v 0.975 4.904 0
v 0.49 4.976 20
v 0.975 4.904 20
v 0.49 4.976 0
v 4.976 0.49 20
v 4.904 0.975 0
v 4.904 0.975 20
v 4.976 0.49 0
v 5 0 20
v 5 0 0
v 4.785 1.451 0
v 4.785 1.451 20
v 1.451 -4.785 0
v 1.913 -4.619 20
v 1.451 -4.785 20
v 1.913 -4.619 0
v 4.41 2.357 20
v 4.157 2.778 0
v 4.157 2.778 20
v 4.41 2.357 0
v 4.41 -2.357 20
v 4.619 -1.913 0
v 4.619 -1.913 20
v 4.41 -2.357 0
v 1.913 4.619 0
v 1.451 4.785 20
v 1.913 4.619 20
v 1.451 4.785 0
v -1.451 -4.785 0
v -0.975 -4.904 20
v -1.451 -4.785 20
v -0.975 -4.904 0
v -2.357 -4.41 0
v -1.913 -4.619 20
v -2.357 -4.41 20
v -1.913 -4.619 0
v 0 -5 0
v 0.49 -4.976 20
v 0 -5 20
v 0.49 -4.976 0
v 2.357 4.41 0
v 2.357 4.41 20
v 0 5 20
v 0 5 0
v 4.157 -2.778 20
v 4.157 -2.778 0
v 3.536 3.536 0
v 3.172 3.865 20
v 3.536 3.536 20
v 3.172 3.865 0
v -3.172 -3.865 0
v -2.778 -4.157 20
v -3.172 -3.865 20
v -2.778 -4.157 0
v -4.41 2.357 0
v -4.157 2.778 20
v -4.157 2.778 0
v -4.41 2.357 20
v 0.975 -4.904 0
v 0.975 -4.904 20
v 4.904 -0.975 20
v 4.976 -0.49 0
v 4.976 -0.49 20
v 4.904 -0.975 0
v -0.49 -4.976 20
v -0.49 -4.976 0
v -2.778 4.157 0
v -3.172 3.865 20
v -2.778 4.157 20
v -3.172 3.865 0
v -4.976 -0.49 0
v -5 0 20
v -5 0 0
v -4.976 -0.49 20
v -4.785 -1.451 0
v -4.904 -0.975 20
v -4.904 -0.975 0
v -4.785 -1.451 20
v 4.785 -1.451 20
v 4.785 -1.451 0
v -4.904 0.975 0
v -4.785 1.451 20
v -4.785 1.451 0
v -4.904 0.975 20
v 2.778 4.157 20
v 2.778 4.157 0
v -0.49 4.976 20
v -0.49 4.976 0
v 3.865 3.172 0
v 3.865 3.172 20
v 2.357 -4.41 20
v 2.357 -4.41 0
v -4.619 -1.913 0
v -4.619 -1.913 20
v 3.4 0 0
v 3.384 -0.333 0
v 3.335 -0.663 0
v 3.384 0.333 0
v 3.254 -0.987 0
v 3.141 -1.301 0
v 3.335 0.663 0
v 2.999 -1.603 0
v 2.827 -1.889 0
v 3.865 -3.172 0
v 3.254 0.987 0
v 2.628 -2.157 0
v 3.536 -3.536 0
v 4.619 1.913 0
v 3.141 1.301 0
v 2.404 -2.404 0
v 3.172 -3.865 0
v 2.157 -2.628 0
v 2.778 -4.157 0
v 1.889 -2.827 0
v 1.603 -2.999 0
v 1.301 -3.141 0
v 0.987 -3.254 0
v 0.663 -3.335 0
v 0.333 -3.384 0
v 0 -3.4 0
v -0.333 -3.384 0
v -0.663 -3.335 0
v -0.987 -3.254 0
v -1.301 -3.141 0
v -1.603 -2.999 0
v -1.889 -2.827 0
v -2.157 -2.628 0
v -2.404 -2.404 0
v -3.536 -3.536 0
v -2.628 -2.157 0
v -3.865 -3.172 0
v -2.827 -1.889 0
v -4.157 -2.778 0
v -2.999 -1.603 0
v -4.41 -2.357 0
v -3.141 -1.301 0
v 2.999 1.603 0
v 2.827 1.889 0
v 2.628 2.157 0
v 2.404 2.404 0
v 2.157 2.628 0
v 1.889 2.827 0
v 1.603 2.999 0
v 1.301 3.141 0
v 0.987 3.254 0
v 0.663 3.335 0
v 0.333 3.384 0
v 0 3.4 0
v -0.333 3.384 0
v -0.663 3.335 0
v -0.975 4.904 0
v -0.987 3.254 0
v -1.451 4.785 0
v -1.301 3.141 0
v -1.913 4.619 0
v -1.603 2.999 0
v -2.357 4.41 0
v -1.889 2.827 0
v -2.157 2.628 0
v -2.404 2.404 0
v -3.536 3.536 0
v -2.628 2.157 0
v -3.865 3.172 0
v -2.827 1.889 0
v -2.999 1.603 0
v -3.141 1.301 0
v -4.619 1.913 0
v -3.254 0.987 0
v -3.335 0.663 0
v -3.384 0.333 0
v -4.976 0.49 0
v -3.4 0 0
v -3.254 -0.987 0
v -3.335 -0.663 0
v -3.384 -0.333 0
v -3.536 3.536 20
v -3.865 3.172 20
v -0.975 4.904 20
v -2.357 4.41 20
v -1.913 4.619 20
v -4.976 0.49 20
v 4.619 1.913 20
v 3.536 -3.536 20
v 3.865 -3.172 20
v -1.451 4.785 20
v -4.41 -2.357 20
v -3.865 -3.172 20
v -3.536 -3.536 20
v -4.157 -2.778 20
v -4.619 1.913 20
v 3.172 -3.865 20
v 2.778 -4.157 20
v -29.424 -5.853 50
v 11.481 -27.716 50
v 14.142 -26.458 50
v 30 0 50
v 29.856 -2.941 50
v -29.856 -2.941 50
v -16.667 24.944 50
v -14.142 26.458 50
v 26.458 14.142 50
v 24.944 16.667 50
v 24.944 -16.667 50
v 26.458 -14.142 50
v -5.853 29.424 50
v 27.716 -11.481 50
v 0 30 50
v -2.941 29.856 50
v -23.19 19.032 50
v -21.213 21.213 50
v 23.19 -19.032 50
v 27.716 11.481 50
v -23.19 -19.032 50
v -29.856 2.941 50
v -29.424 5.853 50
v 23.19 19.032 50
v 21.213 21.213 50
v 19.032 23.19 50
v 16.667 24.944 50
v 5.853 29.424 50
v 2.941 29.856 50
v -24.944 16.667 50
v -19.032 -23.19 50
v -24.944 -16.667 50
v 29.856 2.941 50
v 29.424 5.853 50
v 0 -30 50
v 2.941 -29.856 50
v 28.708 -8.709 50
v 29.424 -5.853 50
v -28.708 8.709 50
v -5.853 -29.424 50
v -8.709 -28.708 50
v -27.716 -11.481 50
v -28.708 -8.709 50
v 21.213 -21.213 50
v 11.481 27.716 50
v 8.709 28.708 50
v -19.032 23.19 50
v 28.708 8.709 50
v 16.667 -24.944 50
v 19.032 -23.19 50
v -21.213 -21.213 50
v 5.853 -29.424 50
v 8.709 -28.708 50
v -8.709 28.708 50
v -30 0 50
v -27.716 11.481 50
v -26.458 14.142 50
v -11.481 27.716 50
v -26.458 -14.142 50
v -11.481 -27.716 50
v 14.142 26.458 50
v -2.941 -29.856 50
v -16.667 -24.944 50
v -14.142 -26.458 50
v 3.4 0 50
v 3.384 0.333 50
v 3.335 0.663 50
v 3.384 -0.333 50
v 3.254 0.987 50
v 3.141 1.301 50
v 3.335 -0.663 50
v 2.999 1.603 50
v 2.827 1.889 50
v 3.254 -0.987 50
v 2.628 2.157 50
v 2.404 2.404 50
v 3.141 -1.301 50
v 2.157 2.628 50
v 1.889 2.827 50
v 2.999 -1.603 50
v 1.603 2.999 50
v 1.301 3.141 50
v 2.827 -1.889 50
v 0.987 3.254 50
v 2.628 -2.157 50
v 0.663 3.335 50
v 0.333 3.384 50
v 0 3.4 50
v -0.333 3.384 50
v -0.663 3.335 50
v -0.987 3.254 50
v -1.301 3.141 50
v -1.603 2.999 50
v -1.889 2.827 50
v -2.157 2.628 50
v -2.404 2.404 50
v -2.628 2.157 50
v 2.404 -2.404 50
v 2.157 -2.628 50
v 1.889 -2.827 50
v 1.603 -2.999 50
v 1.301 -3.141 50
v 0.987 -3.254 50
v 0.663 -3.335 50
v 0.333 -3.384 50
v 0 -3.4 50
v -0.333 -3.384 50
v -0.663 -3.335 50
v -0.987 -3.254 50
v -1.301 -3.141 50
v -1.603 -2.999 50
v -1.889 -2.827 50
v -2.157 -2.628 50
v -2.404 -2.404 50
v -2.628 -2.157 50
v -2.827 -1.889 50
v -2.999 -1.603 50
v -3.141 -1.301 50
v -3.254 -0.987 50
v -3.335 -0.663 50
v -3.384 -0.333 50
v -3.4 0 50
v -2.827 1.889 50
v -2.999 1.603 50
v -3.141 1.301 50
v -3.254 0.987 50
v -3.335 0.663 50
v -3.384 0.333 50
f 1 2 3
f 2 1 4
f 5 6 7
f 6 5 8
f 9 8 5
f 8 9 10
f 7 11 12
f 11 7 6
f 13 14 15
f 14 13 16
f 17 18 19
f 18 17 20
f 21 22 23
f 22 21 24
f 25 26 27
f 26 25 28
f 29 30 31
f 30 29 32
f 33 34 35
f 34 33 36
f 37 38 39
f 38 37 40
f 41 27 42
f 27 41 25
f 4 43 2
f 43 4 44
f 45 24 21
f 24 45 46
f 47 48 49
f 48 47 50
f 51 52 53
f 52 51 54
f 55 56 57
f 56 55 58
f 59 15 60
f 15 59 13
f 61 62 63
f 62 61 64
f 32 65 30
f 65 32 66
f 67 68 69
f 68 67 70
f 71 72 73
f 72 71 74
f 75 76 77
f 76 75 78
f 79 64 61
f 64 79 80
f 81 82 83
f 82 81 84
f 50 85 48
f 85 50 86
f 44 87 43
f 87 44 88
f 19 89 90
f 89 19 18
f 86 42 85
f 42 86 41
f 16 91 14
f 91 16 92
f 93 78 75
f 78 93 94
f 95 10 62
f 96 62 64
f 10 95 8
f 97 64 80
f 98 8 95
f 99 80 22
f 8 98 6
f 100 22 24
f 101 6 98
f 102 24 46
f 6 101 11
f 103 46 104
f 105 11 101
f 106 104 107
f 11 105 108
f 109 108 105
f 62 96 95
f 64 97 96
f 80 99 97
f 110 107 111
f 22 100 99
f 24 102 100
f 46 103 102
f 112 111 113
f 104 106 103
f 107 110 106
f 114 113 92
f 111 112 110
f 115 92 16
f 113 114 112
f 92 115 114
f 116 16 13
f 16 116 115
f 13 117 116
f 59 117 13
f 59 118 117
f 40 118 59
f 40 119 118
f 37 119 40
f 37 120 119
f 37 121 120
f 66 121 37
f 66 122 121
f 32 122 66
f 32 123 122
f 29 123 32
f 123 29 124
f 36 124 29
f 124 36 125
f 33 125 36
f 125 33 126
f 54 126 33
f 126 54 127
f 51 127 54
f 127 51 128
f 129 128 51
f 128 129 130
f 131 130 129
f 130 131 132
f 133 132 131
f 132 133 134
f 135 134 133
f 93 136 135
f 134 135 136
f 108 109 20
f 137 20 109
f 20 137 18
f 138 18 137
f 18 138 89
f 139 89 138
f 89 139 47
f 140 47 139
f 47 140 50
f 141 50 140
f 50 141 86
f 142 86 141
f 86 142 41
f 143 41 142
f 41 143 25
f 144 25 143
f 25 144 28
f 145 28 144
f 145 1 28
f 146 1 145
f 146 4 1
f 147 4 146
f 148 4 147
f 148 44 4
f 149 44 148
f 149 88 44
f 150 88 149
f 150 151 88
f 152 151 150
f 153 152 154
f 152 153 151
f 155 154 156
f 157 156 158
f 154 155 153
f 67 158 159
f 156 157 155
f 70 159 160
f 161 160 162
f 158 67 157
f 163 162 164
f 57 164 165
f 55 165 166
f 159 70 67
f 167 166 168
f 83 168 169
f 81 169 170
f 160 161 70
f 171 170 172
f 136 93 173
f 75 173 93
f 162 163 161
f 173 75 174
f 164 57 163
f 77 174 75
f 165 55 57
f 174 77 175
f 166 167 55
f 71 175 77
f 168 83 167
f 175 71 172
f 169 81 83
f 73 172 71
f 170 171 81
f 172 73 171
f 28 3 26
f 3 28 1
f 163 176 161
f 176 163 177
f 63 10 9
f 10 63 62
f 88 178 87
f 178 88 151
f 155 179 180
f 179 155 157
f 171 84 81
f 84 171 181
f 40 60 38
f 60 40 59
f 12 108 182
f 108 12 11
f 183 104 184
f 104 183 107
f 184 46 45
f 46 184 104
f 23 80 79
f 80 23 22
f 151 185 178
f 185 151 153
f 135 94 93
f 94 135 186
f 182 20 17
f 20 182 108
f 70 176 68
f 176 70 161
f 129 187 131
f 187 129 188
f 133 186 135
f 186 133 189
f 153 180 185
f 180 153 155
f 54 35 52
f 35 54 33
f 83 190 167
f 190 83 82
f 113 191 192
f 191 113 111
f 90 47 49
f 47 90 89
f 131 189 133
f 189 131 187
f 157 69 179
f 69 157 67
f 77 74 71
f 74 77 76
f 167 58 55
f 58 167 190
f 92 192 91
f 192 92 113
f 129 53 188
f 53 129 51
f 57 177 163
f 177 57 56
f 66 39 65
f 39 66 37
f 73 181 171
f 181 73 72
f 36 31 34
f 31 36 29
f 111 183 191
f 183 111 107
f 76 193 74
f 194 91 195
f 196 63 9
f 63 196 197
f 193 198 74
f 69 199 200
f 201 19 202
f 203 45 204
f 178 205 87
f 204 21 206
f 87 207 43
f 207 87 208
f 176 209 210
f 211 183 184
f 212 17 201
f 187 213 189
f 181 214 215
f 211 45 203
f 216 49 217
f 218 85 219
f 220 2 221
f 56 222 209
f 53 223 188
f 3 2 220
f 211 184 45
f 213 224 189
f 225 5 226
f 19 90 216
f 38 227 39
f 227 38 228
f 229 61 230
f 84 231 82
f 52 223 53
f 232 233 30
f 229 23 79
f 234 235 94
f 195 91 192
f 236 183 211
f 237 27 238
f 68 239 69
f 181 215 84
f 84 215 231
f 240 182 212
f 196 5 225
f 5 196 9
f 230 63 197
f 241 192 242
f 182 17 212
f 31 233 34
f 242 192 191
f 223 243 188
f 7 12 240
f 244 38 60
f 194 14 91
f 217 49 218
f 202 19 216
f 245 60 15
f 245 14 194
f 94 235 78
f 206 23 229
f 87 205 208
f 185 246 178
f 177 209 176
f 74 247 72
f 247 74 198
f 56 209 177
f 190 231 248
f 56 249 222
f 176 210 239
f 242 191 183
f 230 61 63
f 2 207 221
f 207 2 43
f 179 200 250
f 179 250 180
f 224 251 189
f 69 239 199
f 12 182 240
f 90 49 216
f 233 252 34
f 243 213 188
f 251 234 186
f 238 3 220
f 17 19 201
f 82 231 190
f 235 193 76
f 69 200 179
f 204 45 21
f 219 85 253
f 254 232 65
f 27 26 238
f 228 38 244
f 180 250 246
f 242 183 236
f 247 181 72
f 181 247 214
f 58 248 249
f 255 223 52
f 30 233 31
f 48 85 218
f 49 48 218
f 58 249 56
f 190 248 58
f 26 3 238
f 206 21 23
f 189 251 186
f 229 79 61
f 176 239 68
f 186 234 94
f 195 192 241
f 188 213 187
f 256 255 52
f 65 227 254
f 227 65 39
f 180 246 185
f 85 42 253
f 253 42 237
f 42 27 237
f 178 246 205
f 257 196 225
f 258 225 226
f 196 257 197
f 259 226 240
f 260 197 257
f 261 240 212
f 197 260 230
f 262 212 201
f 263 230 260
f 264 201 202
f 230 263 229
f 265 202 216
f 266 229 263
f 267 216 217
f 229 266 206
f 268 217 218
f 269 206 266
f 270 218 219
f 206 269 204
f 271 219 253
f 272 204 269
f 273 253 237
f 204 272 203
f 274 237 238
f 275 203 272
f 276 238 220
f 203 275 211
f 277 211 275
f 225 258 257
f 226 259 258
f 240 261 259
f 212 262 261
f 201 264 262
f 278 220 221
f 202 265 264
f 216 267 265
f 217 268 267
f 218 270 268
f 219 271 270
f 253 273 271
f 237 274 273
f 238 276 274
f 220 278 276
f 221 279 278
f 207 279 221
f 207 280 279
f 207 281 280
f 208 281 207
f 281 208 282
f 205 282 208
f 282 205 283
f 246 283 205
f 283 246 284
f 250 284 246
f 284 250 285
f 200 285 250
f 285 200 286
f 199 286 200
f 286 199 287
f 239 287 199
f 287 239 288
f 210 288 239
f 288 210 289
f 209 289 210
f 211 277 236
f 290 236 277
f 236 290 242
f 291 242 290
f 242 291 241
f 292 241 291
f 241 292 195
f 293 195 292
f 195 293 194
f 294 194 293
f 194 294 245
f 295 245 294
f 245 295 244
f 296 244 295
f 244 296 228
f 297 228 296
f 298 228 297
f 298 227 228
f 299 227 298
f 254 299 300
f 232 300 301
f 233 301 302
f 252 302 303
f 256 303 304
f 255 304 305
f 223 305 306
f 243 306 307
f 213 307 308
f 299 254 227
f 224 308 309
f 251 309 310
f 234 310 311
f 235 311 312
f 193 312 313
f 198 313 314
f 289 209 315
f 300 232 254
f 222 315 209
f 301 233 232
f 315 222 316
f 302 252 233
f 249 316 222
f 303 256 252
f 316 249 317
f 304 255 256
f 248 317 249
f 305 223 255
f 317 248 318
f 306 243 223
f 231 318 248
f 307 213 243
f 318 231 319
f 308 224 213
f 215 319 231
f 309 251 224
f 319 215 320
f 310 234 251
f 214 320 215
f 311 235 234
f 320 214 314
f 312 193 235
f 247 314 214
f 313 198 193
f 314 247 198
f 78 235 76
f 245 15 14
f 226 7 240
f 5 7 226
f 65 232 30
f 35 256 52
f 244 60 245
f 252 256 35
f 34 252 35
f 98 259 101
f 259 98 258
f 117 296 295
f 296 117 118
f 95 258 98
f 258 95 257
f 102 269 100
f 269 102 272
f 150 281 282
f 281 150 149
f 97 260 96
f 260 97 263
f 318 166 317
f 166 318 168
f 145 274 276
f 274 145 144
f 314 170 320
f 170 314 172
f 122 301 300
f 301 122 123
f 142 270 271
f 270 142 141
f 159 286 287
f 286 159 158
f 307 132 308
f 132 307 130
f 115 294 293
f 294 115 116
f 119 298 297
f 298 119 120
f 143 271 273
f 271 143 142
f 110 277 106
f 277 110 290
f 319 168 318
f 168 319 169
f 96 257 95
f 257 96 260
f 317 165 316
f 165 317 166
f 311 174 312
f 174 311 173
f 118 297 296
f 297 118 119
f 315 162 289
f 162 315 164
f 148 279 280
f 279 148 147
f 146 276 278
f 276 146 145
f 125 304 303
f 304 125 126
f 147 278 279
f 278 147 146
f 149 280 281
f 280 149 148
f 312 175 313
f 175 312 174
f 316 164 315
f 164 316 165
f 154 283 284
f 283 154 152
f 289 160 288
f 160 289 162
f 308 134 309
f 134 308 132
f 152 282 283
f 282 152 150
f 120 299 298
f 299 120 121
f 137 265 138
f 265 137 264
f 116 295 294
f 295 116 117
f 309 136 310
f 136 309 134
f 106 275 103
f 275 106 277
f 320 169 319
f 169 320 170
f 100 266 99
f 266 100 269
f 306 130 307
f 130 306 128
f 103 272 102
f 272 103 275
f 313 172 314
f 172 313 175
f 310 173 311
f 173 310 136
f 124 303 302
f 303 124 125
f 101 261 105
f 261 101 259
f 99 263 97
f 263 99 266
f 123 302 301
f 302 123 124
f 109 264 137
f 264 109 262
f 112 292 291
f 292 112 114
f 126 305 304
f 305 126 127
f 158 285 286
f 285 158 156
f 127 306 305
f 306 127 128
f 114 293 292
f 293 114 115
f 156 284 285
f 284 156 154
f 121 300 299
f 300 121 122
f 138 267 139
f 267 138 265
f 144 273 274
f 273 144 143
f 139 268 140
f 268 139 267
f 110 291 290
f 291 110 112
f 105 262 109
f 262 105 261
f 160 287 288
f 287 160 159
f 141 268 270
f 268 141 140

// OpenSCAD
// Funnel - printed upright, open at top and bottom
// Units: mm

$fn = 64;

// Spout
spout_d      = 10;    // outer diameter
spout_bore   = 6.8;   // bore diameter (wall 1.6)
spout_h      = 20;    // length

// Cone
cone_d1      = 10;    // diameter at z = spout_h
cone_d2      = 60;    // rim diameter
cone_h       = 30;    // height (z = 20 to z = 50)
wall         = 1.6;   // wall thickness

// Cut clearance
eps          = 0.5;   // extension past faces

// Derived
bore_d       = spout_d - 2 * wall;
rim_d        = cone_d2 - 2 * wall;
cone_d1_in   = cone_d1 - 2 * wall;
cone_d2_in   = rim_d;

difference() {
    union() {
        // Spout
        cylinder(d = spout_d, h = spout_h);
        // Cone
        translate([0, 0, spout_h])
            cylinder(d1 = cone_d1, d2 = cone_d2, h = cone_h);
    }
    // Through-bore: spout + cone (slightly extended)
    translate([0, 0, -eps])
        linear_extrude(height = spout_h + cone_h + 2 * eps)
            circle(d = bore_d);
}
